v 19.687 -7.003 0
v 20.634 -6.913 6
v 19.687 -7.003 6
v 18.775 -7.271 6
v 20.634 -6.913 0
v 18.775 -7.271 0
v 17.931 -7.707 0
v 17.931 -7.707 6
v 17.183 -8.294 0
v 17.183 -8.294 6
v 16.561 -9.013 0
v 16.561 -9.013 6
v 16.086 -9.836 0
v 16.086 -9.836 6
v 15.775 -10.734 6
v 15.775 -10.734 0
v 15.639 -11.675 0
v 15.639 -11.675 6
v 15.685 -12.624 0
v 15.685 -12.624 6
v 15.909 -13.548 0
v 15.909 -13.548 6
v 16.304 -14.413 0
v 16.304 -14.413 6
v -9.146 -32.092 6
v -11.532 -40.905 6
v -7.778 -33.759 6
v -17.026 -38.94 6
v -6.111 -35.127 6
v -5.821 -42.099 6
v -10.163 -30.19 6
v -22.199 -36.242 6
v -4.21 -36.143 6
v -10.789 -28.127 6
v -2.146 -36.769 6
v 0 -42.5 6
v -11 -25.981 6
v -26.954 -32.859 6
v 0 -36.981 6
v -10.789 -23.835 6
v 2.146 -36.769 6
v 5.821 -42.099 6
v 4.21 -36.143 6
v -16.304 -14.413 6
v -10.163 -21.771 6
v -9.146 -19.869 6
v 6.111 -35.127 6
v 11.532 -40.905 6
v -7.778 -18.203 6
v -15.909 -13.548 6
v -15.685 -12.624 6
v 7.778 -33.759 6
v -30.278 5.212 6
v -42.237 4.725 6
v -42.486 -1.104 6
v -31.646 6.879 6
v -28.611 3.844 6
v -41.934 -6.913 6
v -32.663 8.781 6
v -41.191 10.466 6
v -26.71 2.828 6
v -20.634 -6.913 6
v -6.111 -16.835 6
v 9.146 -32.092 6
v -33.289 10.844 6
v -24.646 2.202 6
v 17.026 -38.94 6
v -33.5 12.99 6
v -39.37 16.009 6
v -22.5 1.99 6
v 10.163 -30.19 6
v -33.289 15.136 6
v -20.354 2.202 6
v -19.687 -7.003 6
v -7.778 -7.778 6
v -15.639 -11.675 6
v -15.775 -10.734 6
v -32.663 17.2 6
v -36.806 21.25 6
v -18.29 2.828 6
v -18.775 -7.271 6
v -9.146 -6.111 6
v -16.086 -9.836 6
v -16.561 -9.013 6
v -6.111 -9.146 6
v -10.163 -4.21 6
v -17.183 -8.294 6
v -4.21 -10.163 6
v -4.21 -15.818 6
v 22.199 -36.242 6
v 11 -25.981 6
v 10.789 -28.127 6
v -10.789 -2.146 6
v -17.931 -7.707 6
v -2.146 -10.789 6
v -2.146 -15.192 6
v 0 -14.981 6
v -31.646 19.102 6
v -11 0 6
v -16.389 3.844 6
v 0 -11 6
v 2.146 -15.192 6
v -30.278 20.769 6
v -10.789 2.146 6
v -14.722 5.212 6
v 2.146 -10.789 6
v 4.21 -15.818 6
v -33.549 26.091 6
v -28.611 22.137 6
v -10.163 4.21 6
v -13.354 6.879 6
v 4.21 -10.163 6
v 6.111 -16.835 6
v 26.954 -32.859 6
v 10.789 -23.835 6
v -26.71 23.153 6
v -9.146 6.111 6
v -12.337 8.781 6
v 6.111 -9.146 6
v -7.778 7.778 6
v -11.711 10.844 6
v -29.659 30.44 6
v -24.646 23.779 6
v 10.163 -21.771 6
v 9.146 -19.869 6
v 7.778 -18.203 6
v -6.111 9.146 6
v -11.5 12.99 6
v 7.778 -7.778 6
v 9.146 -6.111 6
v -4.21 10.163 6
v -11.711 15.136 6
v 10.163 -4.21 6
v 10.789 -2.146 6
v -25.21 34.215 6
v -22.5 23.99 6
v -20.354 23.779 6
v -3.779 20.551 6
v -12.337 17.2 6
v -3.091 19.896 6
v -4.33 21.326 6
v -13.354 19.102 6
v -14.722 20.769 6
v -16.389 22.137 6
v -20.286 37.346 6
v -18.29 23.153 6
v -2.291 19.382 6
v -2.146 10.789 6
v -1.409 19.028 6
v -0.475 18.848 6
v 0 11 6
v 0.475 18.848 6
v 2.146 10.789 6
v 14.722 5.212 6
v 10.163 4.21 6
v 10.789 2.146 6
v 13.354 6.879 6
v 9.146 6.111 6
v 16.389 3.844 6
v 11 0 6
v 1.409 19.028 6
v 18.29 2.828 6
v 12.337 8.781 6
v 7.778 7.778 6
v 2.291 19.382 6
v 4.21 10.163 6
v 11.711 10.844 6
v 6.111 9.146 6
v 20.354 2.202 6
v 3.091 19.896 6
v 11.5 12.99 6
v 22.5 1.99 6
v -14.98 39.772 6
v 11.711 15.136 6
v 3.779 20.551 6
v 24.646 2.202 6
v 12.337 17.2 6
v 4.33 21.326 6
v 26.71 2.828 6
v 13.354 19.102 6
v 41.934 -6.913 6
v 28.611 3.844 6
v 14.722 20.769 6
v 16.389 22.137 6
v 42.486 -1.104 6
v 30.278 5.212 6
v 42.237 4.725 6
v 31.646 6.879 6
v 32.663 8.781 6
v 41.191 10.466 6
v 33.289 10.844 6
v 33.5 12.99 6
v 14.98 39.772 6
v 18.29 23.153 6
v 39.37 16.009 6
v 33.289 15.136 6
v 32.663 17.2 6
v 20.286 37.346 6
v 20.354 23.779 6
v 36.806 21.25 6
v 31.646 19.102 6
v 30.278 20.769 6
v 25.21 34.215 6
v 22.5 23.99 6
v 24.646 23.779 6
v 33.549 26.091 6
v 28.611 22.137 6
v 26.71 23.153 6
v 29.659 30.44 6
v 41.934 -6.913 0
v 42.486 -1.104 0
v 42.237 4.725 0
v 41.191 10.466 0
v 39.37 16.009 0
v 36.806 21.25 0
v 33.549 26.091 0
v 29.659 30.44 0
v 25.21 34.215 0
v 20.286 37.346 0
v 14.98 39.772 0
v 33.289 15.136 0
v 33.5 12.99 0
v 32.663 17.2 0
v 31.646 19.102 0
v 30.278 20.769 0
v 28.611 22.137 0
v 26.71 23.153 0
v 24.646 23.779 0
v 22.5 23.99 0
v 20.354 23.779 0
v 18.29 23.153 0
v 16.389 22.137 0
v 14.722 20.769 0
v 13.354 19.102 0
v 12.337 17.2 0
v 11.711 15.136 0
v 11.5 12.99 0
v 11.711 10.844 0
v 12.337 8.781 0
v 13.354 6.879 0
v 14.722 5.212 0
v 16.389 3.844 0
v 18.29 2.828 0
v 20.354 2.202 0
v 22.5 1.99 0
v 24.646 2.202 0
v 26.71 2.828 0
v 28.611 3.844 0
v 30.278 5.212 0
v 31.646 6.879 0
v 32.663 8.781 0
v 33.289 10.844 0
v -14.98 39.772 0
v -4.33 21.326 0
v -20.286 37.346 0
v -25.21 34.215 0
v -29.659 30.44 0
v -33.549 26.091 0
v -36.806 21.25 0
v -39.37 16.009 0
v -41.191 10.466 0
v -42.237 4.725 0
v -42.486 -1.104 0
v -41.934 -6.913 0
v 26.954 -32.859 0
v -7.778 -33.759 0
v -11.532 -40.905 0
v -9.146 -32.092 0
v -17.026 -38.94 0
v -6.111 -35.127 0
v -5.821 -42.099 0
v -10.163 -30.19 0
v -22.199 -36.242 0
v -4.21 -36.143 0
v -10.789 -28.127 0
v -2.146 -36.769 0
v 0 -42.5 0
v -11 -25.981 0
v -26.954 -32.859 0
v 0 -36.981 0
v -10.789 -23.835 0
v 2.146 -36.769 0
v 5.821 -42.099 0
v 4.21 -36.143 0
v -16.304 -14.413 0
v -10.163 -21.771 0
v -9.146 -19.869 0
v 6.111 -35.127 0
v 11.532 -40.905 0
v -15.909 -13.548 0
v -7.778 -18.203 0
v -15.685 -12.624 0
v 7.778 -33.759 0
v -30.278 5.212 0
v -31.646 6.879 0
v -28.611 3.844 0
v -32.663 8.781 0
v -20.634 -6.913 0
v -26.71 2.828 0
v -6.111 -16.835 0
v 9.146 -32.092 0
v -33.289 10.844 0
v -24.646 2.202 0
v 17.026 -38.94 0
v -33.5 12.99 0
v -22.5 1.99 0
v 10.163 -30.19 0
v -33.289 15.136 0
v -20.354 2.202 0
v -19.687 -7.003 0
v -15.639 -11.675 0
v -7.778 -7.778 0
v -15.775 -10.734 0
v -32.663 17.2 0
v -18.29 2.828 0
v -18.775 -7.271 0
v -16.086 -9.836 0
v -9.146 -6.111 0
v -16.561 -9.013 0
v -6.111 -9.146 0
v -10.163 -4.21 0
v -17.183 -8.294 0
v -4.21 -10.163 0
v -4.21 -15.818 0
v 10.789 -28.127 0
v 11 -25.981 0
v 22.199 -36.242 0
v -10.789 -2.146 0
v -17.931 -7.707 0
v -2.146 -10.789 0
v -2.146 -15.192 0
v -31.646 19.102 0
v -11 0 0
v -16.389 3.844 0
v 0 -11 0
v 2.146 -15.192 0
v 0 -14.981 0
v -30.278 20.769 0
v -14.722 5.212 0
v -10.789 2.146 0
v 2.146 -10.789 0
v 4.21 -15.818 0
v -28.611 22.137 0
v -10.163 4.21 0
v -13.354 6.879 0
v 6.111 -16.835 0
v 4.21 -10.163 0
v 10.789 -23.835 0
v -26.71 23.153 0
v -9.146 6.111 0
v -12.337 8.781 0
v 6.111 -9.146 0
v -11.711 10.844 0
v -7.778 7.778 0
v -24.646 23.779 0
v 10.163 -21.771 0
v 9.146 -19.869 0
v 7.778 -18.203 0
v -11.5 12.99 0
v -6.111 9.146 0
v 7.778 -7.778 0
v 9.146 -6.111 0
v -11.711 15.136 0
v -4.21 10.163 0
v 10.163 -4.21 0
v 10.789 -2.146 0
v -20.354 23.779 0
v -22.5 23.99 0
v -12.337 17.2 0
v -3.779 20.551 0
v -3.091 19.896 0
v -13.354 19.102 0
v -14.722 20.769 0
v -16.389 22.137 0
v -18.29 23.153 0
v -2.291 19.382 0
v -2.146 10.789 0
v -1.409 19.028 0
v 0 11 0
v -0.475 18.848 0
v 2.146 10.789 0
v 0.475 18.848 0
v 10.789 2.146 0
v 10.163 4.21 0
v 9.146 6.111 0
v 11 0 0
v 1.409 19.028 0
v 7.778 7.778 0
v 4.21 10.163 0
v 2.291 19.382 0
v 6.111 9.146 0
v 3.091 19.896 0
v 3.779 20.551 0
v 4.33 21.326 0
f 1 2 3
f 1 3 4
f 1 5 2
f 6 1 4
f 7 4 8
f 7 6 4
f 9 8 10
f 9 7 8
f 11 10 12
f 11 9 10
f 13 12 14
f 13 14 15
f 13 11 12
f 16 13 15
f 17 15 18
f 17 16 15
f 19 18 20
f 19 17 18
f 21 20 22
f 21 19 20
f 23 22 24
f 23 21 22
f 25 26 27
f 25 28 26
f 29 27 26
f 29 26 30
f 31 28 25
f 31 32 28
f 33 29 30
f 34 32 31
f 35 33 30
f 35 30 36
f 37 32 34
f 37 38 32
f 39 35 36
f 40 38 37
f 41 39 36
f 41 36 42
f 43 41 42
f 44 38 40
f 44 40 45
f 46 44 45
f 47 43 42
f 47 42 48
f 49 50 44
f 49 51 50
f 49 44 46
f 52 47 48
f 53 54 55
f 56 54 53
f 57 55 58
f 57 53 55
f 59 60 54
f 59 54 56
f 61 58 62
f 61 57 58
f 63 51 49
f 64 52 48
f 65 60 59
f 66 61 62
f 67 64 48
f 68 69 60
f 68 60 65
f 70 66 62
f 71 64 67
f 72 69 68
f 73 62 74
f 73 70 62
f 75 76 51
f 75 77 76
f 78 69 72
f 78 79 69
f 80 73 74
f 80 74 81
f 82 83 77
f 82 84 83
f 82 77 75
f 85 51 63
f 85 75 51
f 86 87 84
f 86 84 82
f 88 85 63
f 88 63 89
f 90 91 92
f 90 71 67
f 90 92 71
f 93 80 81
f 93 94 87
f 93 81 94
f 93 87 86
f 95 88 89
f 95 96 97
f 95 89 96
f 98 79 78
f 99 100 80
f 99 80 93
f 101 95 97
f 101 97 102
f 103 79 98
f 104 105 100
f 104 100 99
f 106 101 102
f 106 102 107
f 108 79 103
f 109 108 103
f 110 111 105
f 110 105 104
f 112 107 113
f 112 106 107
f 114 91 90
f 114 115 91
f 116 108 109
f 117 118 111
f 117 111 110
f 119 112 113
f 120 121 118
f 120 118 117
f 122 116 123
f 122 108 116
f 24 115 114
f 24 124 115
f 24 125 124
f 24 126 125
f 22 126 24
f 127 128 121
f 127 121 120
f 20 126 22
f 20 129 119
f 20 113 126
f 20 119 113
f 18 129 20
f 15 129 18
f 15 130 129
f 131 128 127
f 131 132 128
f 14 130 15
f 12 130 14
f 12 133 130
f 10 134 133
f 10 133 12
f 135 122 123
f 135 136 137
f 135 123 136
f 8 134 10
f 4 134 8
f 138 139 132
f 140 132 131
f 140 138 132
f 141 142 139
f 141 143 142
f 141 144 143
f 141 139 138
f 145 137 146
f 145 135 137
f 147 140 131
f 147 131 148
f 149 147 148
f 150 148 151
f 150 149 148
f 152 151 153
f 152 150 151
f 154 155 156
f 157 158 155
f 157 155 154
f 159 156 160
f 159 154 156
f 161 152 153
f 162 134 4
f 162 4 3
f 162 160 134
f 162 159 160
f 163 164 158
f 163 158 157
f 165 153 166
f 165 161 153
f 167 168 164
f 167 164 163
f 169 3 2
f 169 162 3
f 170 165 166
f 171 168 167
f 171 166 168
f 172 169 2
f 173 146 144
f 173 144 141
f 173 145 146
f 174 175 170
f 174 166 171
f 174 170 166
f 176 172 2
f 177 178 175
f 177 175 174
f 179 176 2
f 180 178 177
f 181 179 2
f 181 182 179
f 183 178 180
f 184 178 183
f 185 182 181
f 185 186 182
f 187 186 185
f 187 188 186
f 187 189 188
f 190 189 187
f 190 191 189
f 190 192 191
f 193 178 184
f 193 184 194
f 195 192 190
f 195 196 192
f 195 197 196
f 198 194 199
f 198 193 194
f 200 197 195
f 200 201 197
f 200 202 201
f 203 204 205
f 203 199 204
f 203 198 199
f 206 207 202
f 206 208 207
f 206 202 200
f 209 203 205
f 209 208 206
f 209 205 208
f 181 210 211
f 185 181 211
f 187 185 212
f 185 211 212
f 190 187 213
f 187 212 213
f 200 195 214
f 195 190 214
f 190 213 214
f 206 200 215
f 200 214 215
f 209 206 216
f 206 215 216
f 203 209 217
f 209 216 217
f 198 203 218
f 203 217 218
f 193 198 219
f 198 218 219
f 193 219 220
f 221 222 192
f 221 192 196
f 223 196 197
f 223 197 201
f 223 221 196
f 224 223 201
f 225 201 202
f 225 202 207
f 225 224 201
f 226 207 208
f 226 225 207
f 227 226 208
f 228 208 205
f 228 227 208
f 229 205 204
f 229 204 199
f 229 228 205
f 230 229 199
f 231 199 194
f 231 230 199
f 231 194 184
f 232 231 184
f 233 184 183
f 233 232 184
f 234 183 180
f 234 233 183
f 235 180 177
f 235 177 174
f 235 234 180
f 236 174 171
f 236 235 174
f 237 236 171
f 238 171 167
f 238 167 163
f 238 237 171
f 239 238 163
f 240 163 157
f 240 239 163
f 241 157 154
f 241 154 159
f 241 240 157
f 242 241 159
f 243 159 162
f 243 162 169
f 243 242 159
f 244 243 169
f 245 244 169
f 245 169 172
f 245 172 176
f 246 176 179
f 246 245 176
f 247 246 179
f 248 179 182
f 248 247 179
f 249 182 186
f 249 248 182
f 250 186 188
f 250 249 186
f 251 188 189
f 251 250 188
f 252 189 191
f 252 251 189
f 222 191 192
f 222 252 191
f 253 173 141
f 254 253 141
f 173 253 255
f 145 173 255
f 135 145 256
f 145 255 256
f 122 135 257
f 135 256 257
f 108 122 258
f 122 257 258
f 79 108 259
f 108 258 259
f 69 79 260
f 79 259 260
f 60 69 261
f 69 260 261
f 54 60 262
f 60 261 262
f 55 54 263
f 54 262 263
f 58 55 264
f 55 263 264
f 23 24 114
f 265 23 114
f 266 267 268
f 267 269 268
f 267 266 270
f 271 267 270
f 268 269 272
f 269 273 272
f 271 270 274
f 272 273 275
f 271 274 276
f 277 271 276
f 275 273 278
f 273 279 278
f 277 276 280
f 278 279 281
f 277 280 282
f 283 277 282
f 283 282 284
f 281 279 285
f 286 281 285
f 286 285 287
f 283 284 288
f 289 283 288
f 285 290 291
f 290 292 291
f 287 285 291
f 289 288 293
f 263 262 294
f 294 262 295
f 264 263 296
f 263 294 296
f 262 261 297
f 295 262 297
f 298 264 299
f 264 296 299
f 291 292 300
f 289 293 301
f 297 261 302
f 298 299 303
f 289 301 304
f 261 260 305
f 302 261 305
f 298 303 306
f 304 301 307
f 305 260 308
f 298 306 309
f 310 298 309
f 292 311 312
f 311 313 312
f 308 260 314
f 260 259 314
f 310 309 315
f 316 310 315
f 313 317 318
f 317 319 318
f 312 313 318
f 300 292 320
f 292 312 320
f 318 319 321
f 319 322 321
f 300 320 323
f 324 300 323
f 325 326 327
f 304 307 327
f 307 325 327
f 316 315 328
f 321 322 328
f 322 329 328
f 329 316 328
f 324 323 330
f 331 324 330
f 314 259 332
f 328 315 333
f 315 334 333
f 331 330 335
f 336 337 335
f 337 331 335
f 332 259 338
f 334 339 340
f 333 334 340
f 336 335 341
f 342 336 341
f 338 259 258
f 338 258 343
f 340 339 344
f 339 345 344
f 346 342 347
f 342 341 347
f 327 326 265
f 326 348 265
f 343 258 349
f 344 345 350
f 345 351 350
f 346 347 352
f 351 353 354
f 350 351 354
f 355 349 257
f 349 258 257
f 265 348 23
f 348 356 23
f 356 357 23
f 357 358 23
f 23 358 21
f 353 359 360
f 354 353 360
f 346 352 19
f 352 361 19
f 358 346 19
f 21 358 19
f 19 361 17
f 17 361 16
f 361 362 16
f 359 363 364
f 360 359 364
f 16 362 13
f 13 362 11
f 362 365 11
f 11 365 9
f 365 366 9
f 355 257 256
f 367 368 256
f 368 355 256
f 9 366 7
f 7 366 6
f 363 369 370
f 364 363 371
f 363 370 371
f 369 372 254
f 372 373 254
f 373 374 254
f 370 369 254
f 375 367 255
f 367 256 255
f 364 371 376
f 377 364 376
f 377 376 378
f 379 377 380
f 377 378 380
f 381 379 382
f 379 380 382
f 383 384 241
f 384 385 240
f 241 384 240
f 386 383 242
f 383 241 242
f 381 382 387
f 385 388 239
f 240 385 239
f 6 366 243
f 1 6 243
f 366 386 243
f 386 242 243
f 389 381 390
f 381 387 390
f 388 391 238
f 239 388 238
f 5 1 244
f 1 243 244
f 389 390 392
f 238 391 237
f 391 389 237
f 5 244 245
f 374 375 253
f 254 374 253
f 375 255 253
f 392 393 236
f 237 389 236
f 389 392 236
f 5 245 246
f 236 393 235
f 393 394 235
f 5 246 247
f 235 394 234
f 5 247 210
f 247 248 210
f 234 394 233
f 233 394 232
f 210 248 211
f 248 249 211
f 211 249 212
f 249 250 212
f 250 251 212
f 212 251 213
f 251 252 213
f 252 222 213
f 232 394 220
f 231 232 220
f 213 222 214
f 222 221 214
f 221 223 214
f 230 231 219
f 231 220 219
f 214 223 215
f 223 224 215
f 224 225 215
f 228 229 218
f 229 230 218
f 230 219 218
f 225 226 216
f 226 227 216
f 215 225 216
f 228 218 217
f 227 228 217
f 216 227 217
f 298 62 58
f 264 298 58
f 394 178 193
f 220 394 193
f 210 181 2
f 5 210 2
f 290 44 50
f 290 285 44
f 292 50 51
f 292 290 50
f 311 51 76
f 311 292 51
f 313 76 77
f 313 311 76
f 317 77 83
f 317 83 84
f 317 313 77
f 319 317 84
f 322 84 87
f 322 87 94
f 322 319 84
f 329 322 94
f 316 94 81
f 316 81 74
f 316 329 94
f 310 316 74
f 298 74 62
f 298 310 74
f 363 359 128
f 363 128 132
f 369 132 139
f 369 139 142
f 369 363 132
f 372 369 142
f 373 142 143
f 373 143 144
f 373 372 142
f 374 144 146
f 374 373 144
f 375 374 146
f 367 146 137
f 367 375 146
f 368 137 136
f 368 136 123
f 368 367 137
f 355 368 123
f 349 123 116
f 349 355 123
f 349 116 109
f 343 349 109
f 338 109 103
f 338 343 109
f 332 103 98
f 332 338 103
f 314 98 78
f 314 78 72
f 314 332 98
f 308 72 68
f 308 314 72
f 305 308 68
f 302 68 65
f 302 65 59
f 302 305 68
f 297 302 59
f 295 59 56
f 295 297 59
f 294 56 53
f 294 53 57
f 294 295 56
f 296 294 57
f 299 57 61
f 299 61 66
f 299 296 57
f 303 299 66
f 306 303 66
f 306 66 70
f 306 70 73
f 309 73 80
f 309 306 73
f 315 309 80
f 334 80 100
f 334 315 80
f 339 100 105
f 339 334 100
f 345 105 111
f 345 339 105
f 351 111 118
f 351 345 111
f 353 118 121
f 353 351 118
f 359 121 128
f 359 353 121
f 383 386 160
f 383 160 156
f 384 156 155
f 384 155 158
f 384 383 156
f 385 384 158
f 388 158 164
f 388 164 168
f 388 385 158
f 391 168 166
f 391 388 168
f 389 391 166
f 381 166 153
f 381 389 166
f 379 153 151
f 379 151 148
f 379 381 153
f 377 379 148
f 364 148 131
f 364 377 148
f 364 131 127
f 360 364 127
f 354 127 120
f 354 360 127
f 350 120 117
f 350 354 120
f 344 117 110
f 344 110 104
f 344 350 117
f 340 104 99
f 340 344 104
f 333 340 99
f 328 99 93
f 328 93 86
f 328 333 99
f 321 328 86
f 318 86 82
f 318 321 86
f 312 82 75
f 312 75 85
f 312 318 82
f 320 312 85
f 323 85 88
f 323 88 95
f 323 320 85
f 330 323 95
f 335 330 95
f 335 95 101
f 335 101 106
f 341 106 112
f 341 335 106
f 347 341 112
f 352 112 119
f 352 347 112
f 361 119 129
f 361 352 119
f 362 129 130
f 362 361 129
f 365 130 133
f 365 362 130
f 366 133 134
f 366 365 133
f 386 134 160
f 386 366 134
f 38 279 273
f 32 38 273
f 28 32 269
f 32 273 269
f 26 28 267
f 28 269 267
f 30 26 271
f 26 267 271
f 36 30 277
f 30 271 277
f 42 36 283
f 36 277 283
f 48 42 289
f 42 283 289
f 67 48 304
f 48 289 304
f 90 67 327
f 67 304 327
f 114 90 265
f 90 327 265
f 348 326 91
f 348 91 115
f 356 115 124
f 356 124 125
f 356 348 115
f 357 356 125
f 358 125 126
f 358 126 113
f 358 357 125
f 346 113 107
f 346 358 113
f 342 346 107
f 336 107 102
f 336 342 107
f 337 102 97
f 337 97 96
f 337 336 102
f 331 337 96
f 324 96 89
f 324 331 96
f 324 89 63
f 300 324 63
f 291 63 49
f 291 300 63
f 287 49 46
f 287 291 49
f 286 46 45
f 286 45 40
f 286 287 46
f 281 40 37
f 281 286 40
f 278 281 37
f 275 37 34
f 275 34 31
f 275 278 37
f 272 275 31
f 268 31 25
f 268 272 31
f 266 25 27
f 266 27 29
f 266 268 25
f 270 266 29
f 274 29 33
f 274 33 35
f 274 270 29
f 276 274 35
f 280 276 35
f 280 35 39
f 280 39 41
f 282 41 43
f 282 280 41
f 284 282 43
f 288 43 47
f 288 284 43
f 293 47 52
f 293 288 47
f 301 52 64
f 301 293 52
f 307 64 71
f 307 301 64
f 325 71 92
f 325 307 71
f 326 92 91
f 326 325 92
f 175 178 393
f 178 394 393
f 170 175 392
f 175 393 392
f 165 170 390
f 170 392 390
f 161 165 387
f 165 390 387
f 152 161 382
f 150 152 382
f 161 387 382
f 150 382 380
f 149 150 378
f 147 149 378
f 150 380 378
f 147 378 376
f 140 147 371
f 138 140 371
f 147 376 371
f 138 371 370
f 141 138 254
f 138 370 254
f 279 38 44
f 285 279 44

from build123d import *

# Parameters (mm, degrees)
F0_R            = 42.5
F0_R_2          = 11
F1_DEPTH        = 6
F3_DEPTH        = 25
F3_COPIES_COUNT = 3
F4_R            = 5


# Not quite as in the source:
# - a pattern or mirror of a feature is missing from the dataset's text; its kind, count and spacing are read off the source's solid


with BuildPart() as f1:
    # F0 (on Top) → F1 (new body)
    with BuildSketch(Plane.XY):
        Circle(F0_R)
        with Locations((0, -25.9807621135)):
            Circle(F0_R_2, mode=Mode.SUBTRACT)
        with Locations((-22.5, 12.9903810568)):
            Circle(F0_R_2, mode=Mode.SUBTRACT)
        Circle(F0_R_2, mode=Mode.SUBTRACT)
        with Locations((22.5, 12.9903810568)):
            Circle(F0_R_2, mode=Mode.SUBTRACT)
    extrude(amount=F1_DEPTH)

    # F2 (on face) → F3 (cut)
    with BuildSketch(Plane.XY.offset(6)):
        with BuildLine():
            Line((11.9734825652, -6.9128933822), (26.9537505179, -32.8594785872))
            ThreePointArc((26.9537505179, -32.8594785872), (36.8060796608, -21.25), (41.9340184705, -6.9128933822))
            Line((41.9340184705, -6.9128933822), (11.9734825652, -6.9128933822))
        make_face()
    f3 = extrude(amount=-F3_DEPTH, mode=Mode.SUBTRACT)

    # F3_copies: F3 ×3 about axis
    f3_copies_axis = Axis((0, 0, 0), (0, 0, 1))
    for i in range(1, F3_COPIES_COUNT):
        add(f3.rotate(f3_copies_axis, i * 360 / F3_COPIES_COUNT), mode=Mode.SUBTRACT)

    # F4
    f4_edges = [f1.edges().sort_by_distance(p)[0] for p in [
        (11.973483, -6.912893, 3),
        (0, 13.825787, 3),
        (-11.973483, -6.912893, 3),
    ]]
    fillet(f4_edges, radius=F4_R)


solid = f1.part
